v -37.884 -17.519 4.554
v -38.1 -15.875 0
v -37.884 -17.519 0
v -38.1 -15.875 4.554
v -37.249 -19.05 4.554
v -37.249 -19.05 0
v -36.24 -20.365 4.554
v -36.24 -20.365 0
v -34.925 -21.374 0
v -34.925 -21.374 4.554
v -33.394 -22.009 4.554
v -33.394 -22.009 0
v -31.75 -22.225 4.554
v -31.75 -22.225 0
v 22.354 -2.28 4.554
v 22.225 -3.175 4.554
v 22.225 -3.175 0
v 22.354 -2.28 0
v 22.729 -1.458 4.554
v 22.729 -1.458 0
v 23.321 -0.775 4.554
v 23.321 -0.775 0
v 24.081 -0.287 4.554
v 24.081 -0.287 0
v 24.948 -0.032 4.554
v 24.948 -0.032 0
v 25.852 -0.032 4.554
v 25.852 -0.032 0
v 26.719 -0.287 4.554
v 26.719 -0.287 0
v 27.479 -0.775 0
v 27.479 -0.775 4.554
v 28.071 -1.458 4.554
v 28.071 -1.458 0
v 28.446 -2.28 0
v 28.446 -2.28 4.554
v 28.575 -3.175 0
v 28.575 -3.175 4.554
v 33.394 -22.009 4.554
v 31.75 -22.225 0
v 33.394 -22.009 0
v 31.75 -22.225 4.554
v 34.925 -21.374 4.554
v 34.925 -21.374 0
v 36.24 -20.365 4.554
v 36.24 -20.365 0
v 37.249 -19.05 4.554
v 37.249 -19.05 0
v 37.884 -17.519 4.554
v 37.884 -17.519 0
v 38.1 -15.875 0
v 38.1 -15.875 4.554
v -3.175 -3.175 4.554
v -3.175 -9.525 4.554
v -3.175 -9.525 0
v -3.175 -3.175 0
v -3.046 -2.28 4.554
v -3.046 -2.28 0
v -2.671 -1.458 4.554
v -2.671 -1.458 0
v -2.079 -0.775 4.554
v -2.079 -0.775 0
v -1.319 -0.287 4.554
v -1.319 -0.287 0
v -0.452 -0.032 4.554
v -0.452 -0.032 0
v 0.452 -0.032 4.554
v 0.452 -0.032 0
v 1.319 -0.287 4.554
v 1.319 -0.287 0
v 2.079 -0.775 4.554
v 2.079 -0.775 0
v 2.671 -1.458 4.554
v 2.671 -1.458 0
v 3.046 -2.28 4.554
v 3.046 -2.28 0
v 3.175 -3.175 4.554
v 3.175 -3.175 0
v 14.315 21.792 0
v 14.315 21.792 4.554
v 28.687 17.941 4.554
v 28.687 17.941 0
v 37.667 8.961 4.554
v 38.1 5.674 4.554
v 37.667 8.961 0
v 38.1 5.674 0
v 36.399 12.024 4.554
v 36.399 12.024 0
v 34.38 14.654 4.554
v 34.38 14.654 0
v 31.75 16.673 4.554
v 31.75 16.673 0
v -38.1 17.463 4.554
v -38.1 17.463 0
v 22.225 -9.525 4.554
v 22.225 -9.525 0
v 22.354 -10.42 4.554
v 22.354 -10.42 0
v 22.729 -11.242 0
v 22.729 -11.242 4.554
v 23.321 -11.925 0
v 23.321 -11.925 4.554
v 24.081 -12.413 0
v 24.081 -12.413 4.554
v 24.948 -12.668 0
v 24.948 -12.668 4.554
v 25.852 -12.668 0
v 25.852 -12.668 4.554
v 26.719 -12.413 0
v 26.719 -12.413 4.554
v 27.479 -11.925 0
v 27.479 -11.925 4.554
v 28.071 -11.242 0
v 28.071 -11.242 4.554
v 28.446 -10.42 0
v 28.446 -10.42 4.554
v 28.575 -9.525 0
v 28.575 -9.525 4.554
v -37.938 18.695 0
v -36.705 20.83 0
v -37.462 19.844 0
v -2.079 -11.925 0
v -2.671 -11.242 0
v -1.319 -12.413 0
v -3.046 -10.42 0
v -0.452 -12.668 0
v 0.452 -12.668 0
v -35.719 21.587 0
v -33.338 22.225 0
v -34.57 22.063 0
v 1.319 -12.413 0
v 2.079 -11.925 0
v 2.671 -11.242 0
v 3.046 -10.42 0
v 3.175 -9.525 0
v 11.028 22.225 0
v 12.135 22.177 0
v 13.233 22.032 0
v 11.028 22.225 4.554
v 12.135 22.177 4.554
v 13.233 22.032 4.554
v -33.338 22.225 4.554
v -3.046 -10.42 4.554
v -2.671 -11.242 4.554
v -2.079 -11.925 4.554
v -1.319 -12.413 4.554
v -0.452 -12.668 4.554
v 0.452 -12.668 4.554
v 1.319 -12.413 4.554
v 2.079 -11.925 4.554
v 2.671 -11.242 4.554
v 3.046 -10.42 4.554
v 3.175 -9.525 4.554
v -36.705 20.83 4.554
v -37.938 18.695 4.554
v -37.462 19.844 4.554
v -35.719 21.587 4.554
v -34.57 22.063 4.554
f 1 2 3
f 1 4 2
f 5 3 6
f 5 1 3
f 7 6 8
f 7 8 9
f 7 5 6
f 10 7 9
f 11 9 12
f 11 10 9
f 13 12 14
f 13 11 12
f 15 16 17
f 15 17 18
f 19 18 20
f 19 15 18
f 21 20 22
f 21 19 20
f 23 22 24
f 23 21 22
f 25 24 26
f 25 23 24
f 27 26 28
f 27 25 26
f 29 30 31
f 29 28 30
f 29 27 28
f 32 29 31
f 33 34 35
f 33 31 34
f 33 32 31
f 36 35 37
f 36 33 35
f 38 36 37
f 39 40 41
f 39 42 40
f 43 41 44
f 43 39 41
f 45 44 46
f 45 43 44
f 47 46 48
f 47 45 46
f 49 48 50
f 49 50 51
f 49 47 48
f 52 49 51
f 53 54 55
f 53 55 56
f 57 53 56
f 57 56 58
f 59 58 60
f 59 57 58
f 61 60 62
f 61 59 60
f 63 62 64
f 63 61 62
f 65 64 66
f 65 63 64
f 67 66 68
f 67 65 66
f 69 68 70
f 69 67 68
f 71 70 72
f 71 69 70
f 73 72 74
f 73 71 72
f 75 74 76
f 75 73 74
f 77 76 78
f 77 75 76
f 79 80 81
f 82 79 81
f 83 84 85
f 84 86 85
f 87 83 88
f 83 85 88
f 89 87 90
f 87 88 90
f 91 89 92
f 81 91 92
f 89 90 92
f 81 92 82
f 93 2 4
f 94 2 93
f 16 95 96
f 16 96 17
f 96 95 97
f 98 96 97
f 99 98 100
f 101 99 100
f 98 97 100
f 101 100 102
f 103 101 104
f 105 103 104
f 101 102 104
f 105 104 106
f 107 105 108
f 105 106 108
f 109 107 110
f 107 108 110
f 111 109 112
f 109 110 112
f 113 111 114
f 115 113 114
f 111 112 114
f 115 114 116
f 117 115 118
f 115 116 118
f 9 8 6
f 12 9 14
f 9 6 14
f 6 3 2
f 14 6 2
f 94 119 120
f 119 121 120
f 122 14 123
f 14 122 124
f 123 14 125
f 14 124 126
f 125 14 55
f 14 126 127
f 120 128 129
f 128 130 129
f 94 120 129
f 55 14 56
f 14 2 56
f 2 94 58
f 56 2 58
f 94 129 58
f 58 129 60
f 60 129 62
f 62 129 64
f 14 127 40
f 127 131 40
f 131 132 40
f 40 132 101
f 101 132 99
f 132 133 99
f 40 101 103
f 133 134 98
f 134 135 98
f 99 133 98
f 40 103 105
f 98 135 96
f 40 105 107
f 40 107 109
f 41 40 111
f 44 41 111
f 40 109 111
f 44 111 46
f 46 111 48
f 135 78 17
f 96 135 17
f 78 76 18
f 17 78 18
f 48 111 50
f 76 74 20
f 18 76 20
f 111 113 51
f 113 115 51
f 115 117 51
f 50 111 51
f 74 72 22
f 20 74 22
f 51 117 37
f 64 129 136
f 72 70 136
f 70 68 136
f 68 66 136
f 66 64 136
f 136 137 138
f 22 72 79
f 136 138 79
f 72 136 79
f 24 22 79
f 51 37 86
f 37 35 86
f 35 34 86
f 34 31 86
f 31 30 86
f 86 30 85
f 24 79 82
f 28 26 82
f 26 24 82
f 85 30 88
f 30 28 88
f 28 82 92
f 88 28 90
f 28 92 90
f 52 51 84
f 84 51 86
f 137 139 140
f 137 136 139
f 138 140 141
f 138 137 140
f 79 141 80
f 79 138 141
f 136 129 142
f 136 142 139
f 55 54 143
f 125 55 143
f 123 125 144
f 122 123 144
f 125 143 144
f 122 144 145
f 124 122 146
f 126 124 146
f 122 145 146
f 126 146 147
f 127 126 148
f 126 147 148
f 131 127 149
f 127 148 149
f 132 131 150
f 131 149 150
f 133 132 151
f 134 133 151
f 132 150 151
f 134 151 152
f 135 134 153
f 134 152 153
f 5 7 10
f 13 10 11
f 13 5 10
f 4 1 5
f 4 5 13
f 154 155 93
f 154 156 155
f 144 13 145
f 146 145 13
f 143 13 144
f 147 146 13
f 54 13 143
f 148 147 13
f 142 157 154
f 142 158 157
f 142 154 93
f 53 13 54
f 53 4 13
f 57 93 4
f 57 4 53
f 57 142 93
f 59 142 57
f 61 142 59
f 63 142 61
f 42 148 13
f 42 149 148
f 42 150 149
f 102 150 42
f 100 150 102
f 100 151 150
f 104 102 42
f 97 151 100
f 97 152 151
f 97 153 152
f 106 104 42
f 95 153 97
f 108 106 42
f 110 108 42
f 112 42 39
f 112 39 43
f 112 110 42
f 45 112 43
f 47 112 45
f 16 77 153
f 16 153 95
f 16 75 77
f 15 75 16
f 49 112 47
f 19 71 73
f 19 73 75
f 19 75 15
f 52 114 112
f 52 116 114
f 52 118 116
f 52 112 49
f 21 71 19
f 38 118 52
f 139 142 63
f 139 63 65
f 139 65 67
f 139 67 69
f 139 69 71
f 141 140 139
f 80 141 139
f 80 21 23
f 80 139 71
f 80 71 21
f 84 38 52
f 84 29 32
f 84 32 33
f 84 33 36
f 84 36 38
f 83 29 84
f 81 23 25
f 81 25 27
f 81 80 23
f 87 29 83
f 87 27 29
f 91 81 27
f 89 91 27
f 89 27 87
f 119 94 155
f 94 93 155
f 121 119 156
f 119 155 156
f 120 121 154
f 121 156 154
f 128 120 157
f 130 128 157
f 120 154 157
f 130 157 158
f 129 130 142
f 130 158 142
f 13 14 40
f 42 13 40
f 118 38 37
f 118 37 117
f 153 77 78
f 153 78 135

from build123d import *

# Parameters (mm, degrees)
SKETCH1_W          = 76.2
SKETCH1_H          = 44.45
BASE_FLANGE1_DEPTH = 4.55422
CUT_EXTRUDE1_DEPTH = 45.342998825
FILLET1_R          = 4.7625
FILLET2_R          = 12.7
SKETCH3_R          = 3.175
CUT_EXTRUDE2_DEPTH = 45.342998825
FILLET3_R          = 6.35
CUT_EXTRUDE3_DEPTH = 45.342998825


# Sheet-metal steps are written as plain solids
with BuildPart() as part:
    # Sketch1 → Base-Flange1 (new body)
    with BuildSketch(Plane.XY):
        Rectangle(SKETCH1_W, SKETCH1_H)
    extrude(amount=BASE_FLANGE1_DEPTH)

    # Sketch2 → Cut-Extrude1 (cut, through all)
    with BuildSketch(Plane.XY.offset(4.55422)):
        Polygon((12.7, 22.225), (38.1, 15.419090512), (38.1, 22.225), align=None)
    extrude(amount=-CUT_EXTRUDE1_DEPTH, mode=Mode.SUBTRACT)

    # Fillet1
    fillet1_edges = [part.edges().sort_by_distance(p)[0] for p in [
        (-38.1, 22.225, 2.27711),
    ]]
    fillet(fillet1_edges, radius=FILLET1_R)

    # Fillet2
    fillet2_edges = [part.edges().sort_by_distance(p)[0] for p in [
        (12.7, 22.225, 2.27711),
        (38.1, 15.419090512, 2.27711),
    ]]
    fillet(fillet2_edges, radius=FILLET2_R)

    # Sketch3 → Cut-Extrude2 (cut, through all)
    with BuildSketch(Plane.XY.offset(4.55422)):
        with Locations((0, -9.525)):
            Circle(SKETCH3_R)
        with Locations((25.4, -9.525)):
            Circle(SKETCH3_R)
    extrude(amount=-CUT_EXTRUDE2_DEPTH, mode=Mode.SUBTRACT)

    # Fillet3
    fillet3_edges = [part.edges().sort_by_distance(p)[0] for p in [
        (38.1, -22.225, 2.27711),
        (-38.1, -22.225, 2.27711),
    ]]
    fillet(fillet3_edges, radius=FILLET3_R)

    # Sketch4 → Cut-Extrude3 (cut, through all)
    with BuildSketch(Plane.XY.offset(4.55422)):
        with BuildLine():
            Line((-3.175, -9.525), (-3.175, -3.175))
            ThreePointArc((-3.175, -3.175), (0, 0), (3.175, -3.175))
            Line((3.175, -3.175), (3.175, -9.525))
            ThreePointArc((3.175, -9.525), (0, -12.7), (-3.175, -9.525))
        make_face()
        with BuildLine():
            Line((22.225, -9.525), (22.225, -3.175))
            ThreePointArc((22.225, -3.175), (25.4, 0), (28.575, -3.175))
            Line((28.575, -3.175), (28.575, -9.525))
            ThreePointArc((28.575, -9.525), (25.4, -12.7), (22.225, -9.525))
        make_face()
    extrude(amount=-CUT_EXTRUDE3_DEPTH, mode=Mode.SUBTRACT)


solid = part.part
